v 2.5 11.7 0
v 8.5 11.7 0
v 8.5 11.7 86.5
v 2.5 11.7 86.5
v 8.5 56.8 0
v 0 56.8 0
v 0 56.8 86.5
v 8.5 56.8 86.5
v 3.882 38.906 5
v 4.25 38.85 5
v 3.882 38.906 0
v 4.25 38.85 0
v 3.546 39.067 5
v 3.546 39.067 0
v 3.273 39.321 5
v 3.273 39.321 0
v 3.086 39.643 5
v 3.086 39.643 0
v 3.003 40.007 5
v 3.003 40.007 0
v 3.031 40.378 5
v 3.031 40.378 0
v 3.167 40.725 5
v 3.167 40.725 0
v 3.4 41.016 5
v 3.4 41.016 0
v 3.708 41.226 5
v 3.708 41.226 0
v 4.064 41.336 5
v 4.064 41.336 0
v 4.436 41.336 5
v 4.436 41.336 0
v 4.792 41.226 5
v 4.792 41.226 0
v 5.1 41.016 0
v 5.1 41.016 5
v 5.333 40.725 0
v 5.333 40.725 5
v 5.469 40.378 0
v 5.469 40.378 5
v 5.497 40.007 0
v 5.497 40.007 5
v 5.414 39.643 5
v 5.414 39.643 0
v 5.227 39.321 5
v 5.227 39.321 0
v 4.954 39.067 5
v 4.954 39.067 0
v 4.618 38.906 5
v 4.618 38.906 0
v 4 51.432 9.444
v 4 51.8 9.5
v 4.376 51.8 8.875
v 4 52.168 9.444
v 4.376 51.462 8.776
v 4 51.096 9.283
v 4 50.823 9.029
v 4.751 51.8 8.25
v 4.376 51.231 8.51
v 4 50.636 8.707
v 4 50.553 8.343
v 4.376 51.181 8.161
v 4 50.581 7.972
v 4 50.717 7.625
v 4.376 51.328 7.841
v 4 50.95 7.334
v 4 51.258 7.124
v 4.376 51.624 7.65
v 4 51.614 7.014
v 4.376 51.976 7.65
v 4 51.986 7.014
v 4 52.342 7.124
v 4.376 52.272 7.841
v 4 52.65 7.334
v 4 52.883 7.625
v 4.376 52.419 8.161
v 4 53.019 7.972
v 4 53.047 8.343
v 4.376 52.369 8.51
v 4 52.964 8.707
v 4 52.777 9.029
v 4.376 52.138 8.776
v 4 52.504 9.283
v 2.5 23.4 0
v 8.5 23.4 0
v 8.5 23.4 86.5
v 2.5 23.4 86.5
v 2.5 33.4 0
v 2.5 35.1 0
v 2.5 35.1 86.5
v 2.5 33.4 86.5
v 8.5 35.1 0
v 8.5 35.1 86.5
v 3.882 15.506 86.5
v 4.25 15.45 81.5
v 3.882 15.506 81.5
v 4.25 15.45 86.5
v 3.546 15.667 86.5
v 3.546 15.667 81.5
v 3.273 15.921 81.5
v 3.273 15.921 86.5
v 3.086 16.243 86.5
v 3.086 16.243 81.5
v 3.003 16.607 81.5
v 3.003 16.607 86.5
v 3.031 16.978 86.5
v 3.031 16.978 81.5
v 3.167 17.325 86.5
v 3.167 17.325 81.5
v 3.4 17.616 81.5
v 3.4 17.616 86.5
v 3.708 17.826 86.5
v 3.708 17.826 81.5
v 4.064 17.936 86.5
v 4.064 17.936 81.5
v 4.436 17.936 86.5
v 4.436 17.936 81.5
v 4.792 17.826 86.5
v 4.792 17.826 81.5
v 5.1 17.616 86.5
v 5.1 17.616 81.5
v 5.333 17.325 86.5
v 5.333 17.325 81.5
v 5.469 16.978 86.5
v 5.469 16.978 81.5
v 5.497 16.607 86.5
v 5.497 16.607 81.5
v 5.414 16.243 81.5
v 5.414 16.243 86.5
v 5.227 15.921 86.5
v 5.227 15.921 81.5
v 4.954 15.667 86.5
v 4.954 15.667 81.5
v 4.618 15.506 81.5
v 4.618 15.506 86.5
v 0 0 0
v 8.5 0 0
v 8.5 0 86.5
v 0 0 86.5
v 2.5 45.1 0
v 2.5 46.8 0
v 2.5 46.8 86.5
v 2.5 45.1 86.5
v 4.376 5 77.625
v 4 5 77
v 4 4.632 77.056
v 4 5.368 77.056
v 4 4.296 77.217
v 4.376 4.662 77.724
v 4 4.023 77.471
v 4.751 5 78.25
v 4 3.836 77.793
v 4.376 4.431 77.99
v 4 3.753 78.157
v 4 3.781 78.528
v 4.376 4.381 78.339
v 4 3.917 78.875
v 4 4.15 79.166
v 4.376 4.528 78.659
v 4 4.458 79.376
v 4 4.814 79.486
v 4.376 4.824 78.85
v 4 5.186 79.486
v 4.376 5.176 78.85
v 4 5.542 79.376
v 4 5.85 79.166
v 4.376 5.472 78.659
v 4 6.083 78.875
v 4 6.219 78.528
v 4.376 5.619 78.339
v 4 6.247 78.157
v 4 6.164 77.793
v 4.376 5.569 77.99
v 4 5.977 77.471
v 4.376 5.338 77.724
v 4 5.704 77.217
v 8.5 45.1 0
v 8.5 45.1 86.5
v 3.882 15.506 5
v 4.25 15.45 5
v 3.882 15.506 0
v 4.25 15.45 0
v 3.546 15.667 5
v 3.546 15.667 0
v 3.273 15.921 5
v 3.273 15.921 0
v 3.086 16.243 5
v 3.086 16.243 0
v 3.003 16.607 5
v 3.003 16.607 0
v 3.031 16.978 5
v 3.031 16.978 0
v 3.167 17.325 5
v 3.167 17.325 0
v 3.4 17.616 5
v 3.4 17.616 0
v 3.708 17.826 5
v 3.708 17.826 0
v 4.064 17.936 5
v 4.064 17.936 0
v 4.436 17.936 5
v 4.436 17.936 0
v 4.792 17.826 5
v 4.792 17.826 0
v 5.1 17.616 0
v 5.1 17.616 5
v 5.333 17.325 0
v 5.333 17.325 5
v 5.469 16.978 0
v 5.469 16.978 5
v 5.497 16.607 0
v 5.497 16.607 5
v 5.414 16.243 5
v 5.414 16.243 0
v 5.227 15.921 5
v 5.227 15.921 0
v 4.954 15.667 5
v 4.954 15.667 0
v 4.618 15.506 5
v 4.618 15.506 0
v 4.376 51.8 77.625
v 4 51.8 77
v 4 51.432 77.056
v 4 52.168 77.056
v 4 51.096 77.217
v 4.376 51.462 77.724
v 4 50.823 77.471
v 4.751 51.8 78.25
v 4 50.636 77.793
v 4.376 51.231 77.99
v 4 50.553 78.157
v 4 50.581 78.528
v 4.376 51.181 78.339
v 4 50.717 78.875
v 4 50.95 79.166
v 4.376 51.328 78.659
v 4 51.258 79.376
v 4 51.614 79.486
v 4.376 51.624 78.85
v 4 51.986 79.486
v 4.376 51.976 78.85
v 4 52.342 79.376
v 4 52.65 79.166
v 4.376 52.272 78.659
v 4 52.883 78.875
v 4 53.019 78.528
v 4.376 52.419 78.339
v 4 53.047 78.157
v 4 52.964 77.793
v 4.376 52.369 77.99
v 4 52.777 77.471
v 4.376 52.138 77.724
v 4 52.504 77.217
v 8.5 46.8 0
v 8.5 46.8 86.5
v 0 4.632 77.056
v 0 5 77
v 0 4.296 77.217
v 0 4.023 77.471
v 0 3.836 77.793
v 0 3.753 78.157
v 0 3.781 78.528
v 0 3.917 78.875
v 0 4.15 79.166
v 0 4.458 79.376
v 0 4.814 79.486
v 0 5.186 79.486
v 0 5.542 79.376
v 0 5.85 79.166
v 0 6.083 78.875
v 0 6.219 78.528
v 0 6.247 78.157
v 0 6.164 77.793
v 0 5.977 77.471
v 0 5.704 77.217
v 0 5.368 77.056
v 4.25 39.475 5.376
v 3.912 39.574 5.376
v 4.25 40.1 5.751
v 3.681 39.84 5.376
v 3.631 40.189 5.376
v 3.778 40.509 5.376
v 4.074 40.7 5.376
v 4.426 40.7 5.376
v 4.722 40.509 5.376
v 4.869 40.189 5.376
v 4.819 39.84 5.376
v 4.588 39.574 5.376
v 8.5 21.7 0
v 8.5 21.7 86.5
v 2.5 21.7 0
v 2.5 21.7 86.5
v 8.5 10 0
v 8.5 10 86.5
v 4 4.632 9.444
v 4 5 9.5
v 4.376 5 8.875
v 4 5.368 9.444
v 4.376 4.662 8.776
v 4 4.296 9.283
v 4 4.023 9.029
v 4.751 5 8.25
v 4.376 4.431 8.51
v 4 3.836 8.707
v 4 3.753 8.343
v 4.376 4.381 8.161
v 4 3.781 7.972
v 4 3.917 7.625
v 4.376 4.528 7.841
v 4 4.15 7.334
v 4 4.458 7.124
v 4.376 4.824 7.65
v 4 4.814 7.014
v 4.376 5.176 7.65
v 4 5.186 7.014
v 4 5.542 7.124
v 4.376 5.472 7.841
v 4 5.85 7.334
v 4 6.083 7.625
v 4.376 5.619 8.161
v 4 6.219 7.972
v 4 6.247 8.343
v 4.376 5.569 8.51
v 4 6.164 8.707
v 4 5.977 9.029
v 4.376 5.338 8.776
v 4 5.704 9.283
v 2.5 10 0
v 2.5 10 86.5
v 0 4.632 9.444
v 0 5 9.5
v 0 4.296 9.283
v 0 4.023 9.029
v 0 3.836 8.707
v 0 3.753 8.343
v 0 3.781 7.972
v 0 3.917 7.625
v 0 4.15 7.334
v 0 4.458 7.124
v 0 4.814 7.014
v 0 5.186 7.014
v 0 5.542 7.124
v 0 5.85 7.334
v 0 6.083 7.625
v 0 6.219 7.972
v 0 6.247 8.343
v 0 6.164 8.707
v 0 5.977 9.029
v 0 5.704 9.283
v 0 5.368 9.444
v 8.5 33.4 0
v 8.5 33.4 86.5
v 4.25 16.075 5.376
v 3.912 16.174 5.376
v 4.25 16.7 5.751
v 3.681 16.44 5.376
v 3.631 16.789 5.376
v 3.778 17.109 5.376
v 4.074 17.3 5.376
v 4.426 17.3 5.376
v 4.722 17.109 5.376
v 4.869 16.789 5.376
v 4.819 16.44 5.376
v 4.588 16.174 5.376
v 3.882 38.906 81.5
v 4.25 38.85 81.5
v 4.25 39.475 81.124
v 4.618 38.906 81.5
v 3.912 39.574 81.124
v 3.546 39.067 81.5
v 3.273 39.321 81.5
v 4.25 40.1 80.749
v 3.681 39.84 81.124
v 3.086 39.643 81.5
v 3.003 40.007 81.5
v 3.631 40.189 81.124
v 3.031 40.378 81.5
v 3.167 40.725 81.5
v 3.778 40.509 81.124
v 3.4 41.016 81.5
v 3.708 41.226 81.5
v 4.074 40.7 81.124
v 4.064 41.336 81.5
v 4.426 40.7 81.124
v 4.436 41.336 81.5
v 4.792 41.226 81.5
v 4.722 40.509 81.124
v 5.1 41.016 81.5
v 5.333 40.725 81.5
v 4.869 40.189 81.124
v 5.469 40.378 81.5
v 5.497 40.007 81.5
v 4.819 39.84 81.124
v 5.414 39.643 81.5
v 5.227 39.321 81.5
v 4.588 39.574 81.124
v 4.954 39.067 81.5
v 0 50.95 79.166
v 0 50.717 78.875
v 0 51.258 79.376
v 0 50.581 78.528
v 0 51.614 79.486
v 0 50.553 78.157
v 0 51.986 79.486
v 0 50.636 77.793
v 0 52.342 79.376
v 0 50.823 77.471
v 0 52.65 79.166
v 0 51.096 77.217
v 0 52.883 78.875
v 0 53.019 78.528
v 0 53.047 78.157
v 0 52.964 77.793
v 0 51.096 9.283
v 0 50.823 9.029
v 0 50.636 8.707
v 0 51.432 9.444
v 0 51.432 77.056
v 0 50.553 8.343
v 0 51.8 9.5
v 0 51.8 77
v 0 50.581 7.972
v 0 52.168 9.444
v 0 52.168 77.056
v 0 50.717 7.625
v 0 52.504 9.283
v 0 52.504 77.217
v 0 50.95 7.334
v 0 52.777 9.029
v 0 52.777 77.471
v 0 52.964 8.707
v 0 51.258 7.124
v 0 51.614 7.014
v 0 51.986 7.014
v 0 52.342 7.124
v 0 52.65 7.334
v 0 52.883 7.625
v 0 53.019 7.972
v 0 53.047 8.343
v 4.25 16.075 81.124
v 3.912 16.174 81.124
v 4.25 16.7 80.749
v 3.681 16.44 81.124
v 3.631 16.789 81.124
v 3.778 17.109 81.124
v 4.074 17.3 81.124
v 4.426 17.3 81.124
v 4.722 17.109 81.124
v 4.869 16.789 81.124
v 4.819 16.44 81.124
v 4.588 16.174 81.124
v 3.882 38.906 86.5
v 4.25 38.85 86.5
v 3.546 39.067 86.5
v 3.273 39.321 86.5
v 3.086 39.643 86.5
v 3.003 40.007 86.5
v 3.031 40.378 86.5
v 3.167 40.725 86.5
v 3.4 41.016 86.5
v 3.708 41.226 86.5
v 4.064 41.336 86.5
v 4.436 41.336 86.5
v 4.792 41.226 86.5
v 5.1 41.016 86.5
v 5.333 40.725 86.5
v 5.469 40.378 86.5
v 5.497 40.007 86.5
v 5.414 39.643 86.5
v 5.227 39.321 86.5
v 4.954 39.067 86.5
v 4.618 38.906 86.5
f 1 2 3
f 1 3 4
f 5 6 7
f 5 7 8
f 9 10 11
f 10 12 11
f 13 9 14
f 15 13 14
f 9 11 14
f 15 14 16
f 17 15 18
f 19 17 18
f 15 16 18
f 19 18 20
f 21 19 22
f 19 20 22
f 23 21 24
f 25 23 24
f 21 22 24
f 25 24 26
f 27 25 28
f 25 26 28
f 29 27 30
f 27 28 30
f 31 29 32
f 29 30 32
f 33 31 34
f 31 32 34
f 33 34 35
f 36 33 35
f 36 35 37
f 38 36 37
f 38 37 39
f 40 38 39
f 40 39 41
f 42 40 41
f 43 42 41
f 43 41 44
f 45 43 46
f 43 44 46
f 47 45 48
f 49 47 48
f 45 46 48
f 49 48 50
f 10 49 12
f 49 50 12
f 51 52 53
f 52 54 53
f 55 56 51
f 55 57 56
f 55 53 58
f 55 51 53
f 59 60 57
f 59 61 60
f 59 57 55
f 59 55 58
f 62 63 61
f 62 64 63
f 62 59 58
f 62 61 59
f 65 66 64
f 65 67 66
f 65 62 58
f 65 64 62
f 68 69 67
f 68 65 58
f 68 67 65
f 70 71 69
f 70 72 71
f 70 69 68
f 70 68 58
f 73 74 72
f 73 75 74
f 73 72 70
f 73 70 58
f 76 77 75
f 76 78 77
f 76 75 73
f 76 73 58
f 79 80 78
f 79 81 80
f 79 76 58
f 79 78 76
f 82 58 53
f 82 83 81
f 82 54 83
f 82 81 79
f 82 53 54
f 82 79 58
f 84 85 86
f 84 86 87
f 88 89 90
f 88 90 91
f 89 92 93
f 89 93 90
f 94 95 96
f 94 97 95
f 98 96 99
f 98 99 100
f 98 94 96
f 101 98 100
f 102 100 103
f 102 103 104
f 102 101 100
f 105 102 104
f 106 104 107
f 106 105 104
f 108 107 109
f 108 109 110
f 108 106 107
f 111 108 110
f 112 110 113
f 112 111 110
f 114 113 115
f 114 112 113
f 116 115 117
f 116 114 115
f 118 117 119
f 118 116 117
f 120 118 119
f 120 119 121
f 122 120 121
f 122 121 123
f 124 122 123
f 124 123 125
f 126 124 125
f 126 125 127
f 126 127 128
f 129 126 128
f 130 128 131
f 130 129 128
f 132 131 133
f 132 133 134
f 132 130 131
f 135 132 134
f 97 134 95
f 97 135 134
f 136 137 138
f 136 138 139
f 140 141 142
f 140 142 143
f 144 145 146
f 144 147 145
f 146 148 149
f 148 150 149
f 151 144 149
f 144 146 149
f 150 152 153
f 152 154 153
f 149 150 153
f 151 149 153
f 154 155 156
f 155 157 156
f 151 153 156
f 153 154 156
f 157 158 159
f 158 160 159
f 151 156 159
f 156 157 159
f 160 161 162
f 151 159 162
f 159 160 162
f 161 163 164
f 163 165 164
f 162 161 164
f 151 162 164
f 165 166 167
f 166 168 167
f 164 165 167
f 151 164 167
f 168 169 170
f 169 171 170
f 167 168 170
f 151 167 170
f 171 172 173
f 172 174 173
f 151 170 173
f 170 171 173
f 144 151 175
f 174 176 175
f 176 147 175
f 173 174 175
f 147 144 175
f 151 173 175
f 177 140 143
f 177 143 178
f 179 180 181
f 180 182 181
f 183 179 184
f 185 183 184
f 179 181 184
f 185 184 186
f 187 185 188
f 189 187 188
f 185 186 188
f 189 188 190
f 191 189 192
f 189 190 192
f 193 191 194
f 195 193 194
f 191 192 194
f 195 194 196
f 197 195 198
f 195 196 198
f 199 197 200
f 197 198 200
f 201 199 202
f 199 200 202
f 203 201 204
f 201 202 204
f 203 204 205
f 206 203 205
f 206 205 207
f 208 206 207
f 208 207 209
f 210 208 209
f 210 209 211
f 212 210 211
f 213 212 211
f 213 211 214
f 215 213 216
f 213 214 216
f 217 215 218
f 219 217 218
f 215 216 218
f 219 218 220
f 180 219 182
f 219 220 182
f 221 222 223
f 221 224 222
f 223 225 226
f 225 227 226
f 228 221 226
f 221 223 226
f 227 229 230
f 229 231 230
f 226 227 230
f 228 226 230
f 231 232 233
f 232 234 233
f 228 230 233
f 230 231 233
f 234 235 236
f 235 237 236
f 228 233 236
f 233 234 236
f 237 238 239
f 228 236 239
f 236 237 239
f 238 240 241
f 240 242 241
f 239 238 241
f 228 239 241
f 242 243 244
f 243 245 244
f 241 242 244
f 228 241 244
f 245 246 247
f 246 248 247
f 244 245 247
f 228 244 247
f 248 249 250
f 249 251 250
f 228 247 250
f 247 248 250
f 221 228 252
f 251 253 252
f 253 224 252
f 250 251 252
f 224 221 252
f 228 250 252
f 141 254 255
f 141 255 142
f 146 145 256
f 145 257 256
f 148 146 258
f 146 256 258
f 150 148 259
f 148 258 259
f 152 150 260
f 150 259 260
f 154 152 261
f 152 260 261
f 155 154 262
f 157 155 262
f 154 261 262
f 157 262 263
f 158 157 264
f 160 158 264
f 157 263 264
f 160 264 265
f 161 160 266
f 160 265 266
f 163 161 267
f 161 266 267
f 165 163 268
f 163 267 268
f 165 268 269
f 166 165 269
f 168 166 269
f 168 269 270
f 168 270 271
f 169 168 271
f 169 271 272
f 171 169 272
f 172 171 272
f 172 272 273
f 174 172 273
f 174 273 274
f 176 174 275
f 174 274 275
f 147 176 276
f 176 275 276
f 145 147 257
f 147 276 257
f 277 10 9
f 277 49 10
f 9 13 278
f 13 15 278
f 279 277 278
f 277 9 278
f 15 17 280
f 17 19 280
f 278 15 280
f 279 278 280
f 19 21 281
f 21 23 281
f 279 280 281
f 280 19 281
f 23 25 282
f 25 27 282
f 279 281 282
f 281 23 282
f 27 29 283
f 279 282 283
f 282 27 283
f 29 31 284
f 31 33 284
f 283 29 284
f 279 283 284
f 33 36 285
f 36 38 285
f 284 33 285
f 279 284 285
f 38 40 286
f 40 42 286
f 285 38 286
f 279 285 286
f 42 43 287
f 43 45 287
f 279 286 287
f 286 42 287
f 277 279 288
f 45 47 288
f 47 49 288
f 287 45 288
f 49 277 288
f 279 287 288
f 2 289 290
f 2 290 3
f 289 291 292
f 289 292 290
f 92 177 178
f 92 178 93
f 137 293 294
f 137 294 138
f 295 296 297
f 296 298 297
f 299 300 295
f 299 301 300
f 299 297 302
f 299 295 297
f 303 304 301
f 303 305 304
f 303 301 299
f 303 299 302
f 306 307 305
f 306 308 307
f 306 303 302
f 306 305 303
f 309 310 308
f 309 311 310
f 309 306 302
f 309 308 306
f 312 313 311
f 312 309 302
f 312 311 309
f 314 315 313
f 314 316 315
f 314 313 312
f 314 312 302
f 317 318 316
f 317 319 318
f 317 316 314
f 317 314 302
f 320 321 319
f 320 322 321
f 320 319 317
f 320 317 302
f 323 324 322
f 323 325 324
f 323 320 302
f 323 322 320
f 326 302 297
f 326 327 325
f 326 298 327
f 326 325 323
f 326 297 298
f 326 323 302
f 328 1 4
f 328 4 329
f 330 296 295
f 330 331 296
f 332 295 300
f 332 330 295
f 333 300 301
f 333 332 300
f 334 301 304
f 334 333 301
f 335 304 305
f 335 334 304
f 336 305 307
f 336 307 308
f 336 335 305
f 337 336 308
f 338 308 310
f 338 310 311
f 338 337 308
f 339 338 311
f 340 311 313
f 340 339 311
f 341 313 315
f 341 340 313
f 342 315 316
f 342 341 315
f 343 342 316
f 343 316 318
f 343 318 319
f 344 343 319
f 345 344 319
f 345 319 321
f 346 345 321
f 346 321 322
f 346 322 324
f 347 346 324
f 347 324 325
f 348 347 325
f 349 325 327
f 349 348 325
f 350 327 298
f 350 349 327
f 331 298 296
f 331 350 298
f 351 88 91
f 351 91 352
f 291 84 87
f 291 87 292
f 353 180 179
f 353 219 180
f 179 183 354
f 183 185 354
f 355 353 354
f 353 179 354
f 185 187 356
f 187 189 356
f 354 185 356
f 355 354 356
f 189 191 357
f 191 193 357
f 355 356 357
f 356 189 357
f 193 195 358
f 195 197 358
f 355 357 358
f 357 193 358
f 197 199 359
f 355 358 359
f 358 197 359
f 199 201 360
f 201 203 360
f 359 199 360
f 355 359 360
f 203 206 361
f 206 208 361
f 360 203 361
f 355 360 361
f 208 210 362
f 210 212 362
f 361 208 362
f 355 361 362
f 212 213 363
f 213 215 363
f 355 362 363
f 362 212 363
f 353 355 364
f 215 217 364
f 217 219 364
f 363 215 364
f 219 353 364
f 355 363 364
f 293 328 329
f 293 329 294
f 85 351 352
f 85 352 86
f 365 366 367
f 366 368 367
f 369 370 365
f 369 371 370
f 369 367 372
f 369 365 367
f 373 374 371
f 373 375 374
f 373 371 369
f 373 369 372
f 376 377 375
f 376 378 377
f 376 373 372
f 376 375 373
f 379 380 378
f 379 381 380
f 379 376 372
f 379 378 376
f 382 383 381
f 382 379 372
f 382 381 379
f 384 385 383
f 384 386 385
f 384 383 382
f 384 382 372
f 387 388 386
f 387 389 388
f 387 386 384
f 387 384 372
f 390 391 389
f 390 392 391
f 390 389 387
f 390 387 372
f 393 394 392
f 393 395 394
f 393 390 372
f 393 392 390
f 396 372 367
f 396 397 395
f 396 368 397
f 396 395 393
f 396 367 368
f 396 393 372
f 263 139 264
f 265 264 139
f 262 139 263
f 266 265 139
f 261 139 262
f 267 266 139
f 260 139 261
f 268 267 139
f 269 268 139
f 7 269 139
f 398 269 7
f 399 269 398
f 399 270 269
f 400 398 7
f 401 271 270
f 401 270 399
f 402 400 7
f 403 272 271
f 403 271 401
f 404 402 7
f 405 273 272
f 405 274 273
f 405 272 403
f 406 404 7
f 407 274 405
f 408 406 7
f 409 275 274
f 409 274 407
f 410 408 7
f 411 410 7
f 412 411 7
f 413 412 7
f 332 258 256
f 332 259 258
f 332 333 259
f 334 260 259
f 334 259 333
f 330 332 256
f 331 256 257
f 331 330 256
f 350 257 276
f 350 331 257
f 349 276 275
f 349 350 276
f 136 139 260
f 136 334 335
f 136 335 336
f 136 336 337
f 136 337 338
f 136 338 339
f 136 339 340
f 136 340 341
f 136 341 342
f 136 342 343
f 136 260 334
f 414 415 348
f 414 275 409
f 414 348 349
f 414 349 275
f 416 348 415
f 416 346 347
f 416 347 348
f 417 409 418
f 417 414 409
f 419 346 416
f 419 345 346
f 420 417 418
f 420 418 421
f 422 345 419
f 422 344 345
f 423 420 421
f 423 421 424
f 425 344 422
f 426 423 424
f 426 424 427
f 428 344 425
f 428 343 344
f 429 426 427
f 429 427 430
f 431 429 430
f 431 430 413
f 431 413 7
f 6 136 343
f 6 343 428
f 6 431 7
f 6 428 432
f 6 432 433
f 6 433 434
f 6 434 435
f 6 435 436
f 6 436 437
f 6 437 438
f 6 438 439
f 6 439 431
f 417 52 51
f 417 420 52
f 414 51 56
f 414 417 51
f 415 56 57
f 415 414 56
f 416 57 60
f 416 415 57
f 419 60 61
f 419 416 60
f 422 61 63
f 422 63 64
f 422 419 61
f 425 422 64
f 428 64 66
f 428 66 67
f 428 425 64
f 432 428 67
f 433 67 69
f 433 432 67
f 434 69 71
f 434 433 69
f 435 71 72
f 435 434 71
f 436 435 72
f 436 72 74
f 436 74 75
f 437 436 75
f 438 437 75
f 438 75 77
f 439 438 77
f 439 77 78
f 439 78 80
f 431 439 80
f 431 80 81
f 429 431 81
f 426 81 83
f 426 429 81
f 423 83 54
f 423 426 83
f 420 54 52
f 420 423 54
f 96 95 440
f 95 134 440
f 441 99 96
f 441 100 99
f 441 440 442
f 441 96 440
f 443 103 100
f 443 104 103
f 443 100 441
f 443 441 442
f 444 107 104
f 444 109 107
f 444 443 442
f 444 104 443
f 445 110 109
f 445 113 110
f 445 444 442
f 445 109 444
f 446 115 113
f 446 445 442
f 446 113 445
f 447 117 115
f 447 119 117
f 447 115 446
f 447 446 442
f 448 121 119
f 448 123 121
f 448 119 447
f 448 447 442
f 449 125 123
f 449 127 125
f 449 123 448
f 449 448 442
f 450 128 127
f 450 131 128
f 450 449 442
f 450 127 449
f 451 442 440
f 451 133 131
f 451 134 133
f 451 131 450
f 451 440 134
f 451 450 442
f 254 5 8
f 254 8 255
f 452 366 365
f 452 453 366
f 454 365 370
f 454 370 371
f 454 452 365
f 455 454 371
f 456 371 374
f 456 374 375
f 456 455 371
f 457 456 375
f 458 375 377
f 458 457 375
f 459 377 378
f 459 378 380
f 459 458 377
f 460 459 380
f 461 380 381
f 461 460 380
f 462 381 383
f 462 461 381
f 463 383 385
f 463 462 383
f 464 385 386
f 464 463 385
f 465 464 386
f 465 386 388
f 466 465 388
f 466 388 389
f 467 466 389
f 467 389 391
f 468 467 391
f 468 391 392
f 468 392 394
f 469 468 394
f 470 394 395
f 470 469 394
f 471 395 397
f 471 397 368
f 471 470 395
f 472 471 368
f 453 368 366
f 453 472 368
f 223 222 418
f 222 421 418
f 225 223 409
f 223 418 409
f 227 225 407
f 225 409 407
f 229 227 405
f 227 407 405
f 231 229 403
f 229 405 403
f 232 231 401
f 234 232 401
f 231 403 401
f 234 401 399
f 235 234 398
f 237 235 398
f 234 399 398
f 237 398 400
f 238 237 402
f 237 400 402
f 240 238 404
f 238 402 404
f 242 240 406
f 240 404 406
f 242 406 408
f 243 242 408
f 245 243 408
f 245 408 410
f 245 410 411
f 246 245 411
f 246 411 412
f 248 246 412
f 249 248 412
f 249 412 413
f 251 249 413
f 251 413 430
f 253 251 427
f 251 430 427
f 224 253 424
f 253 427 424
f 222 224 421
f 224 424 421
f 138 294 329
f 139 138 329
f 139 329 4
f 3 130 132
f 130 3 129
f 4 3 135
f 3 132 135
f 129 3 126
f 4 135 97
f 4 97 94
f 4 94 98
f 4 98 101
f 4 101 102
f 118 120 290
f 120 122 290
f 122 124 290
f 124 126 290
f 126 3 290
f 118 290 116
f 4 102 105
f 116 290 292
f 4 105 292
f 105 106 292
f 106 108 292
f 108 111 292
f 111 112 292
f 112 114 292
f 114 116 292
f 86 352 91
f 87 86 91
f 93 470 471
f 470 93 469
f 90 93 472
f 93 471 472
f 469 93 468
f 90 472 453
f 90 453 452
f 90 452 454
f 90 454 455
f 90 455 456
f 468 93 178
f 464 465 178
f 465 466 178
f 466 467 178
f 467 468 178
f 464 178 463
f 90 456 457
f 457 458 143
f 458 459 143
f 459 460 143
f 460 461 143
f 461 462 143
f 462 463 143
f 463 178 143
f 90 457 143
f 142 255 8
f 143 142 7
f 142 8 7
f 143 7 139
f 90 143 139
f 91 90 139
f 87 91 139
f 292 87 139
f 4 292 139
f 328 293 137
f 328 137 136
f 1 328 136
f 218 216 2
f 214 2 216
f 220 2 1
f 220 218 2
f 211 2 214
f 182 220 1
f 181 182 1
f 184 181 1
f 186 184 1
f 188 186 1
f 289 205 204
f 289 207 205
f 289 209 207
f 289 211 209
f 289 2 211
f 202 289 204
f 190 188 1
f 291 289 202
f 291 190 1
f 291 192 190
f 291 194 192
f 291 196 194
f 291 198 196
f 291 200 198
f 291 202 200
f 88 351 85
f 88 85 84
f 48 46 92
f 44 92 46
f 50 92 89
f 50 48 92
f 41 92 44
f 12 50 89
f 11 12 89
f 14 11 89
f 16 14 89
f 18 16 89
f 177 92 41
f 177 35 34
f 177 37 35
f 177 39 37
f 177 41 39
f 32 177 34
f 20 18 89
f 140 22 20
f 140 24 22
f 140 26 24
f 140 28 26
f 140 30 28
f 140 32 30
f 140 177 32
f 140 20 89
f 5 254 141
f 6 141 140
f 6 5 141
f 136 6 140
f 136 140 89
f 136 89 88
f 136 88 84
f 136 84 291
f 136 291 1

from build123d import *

# Parameters (mm, degrees)
BOSS_EXTRUDE1_DEPTH            = 86.5
M3X0_5_TAPPED_HOLE2_AT_2_COUNT = 2
M3X0_5_TAPPED_HOLE2_AT_2_PITCH = 23.4
M3X0_5_TAPPED_HOLE1_AT_2_COUNT = 2
M3X0_5_TAPPED_HOLE1_AT_2_PITCH = 46.8


with BuildPart() as part:
    # Sketch1 → Boss-Extrude1 (new body)
    with BuildSketch(Plane.XY):
        Polygon((0, 0), (0, 56.8), (8.5, 56.8), (8.5, 46.8), (2.5, 46.8), (2.5, 45.1), (8.5, 45.1), (8.5, 35.1), (2.5, 35.1), (2.5, 33.4), (8.5, 33.4), (8.5, 23.4), (2.5, 23.4), (2.5, 21.7), (8.5, 21.7), (8.5, 11.7), (2.5, 11.7), (2.5, 10), (8.5, 10), (8.5, 0), align=None)
    extrude(amount=BOSS_EXTRUDE1_DEPTH)

    # Sketch4 → M3x0.5 Tapped Hole2 (revolve, cut)
    with BuildSketch(Plane(origin=(4.25, 40.1, 86.5), x_dir=(0, -1, 0), z_dir=(1, 0, 0))):
        Polygon((0, 0), (0, 5.751075774), (1.25, 5), (1.25, 0), align=None)
    m3x0_5_tapped_hole2 = revolve(axis=Axis((4.25, 40.1, 92.85), (0, 0, -1)), mode=Mode.SUBTRACT)

    # M3x0.5 Tapped Hole2 at 2: M3x0.5 Tapped Hole2 ×2
    with Locations(*[(0, -i * M3X0_5_TAPPED_HOLE2_AT_2_PITCH, 0) for i in range(1, M3X0_5_TAPPED_HOLE2_AT_2_COUNT)]):
        add(m3x0_5_tapped_hole2, mode=Mode.SUBTRACT)

    # Mirror1: M3x0.5 Tapped Hole2 across plane
    add(m3x0_5_tapped_hole2.mirror(Plane.XY.offset(43.25)), mode=Mode.SUBTRACT)

    # Mirror1 copy 1 sketch → Mirror1 copy 1 (revolve, cut)
    with BuildSketch(Plane(origin=(4.25, 16.7, 0), x_dir=(0, -1, 0), z_dir=(1, 0, 0))):
        Polygon((0, 0), (0, -5.751075774), (1.25, -5), (1.25, 0), align=None)
    revolve(axis=Axis((4.25, 16.7, -6.35), (0, 0, -1)), mode=Mode.SUBTRACT)

    # Sketch11 → M3x0.5 Tapped Hole1 (revolve, cut)
    with BuildSketch(Plane(origin=(0, 5, 8.25), x_dir=(0, 0, 1), z_dir=(0, 1, 0))):
        Polygon((0, 0), (0, 4.751075774), (1.25, 4), (1.25, 0), align=None)
    m3x0_5_tapped_hole1 = revolve(axis=Axis((-6.35, 5, 8.25), (1, 0, 0)), mode=Mode.SUBTRACT)

    # M3x0.5 Tapped Hole1 at 2: M3x0.5 Tapped Hole1 ×2
    with Locations(*[(0, i * M3X0_5_TAPPED_HOLE1_AT_2_PITCH, 0) for i in range(1, M3X0_5_TAPPED_HOLE1_AT_2_COUNT)]):
        add(m3x0_5_tapped_hole1, mode=Mode.SUBTRACT)

    # Mirror2: M3x0.5 Tapped Hole1 across plane
    add(m3x0_5_tapped_hole1.mirror(Plane(origin=(0, 0, 43.25), x_dir=(1, 0, 0), z_dir=(0, 0, -1))), mode=Mode.SUBTRACT)

    # Mirror2 copy 1 sketch → Mirror2 copy 1 (revolve, cut)
    with BuildSketch(Plane(origin=(0, 51.8, 78.25), x_dir=(0, 0, -1), z_dir=(0, 1, 0))):
        Polygon((0, 0), (0, -4.751075774), (1.25, -4), (1.25, 0), align=None)
    revolve(axis=Axis((-6.35, 51.8, 78.25), (-1, 0, 0)), mode=Mode.SUBTRACT)


solid = part.part
